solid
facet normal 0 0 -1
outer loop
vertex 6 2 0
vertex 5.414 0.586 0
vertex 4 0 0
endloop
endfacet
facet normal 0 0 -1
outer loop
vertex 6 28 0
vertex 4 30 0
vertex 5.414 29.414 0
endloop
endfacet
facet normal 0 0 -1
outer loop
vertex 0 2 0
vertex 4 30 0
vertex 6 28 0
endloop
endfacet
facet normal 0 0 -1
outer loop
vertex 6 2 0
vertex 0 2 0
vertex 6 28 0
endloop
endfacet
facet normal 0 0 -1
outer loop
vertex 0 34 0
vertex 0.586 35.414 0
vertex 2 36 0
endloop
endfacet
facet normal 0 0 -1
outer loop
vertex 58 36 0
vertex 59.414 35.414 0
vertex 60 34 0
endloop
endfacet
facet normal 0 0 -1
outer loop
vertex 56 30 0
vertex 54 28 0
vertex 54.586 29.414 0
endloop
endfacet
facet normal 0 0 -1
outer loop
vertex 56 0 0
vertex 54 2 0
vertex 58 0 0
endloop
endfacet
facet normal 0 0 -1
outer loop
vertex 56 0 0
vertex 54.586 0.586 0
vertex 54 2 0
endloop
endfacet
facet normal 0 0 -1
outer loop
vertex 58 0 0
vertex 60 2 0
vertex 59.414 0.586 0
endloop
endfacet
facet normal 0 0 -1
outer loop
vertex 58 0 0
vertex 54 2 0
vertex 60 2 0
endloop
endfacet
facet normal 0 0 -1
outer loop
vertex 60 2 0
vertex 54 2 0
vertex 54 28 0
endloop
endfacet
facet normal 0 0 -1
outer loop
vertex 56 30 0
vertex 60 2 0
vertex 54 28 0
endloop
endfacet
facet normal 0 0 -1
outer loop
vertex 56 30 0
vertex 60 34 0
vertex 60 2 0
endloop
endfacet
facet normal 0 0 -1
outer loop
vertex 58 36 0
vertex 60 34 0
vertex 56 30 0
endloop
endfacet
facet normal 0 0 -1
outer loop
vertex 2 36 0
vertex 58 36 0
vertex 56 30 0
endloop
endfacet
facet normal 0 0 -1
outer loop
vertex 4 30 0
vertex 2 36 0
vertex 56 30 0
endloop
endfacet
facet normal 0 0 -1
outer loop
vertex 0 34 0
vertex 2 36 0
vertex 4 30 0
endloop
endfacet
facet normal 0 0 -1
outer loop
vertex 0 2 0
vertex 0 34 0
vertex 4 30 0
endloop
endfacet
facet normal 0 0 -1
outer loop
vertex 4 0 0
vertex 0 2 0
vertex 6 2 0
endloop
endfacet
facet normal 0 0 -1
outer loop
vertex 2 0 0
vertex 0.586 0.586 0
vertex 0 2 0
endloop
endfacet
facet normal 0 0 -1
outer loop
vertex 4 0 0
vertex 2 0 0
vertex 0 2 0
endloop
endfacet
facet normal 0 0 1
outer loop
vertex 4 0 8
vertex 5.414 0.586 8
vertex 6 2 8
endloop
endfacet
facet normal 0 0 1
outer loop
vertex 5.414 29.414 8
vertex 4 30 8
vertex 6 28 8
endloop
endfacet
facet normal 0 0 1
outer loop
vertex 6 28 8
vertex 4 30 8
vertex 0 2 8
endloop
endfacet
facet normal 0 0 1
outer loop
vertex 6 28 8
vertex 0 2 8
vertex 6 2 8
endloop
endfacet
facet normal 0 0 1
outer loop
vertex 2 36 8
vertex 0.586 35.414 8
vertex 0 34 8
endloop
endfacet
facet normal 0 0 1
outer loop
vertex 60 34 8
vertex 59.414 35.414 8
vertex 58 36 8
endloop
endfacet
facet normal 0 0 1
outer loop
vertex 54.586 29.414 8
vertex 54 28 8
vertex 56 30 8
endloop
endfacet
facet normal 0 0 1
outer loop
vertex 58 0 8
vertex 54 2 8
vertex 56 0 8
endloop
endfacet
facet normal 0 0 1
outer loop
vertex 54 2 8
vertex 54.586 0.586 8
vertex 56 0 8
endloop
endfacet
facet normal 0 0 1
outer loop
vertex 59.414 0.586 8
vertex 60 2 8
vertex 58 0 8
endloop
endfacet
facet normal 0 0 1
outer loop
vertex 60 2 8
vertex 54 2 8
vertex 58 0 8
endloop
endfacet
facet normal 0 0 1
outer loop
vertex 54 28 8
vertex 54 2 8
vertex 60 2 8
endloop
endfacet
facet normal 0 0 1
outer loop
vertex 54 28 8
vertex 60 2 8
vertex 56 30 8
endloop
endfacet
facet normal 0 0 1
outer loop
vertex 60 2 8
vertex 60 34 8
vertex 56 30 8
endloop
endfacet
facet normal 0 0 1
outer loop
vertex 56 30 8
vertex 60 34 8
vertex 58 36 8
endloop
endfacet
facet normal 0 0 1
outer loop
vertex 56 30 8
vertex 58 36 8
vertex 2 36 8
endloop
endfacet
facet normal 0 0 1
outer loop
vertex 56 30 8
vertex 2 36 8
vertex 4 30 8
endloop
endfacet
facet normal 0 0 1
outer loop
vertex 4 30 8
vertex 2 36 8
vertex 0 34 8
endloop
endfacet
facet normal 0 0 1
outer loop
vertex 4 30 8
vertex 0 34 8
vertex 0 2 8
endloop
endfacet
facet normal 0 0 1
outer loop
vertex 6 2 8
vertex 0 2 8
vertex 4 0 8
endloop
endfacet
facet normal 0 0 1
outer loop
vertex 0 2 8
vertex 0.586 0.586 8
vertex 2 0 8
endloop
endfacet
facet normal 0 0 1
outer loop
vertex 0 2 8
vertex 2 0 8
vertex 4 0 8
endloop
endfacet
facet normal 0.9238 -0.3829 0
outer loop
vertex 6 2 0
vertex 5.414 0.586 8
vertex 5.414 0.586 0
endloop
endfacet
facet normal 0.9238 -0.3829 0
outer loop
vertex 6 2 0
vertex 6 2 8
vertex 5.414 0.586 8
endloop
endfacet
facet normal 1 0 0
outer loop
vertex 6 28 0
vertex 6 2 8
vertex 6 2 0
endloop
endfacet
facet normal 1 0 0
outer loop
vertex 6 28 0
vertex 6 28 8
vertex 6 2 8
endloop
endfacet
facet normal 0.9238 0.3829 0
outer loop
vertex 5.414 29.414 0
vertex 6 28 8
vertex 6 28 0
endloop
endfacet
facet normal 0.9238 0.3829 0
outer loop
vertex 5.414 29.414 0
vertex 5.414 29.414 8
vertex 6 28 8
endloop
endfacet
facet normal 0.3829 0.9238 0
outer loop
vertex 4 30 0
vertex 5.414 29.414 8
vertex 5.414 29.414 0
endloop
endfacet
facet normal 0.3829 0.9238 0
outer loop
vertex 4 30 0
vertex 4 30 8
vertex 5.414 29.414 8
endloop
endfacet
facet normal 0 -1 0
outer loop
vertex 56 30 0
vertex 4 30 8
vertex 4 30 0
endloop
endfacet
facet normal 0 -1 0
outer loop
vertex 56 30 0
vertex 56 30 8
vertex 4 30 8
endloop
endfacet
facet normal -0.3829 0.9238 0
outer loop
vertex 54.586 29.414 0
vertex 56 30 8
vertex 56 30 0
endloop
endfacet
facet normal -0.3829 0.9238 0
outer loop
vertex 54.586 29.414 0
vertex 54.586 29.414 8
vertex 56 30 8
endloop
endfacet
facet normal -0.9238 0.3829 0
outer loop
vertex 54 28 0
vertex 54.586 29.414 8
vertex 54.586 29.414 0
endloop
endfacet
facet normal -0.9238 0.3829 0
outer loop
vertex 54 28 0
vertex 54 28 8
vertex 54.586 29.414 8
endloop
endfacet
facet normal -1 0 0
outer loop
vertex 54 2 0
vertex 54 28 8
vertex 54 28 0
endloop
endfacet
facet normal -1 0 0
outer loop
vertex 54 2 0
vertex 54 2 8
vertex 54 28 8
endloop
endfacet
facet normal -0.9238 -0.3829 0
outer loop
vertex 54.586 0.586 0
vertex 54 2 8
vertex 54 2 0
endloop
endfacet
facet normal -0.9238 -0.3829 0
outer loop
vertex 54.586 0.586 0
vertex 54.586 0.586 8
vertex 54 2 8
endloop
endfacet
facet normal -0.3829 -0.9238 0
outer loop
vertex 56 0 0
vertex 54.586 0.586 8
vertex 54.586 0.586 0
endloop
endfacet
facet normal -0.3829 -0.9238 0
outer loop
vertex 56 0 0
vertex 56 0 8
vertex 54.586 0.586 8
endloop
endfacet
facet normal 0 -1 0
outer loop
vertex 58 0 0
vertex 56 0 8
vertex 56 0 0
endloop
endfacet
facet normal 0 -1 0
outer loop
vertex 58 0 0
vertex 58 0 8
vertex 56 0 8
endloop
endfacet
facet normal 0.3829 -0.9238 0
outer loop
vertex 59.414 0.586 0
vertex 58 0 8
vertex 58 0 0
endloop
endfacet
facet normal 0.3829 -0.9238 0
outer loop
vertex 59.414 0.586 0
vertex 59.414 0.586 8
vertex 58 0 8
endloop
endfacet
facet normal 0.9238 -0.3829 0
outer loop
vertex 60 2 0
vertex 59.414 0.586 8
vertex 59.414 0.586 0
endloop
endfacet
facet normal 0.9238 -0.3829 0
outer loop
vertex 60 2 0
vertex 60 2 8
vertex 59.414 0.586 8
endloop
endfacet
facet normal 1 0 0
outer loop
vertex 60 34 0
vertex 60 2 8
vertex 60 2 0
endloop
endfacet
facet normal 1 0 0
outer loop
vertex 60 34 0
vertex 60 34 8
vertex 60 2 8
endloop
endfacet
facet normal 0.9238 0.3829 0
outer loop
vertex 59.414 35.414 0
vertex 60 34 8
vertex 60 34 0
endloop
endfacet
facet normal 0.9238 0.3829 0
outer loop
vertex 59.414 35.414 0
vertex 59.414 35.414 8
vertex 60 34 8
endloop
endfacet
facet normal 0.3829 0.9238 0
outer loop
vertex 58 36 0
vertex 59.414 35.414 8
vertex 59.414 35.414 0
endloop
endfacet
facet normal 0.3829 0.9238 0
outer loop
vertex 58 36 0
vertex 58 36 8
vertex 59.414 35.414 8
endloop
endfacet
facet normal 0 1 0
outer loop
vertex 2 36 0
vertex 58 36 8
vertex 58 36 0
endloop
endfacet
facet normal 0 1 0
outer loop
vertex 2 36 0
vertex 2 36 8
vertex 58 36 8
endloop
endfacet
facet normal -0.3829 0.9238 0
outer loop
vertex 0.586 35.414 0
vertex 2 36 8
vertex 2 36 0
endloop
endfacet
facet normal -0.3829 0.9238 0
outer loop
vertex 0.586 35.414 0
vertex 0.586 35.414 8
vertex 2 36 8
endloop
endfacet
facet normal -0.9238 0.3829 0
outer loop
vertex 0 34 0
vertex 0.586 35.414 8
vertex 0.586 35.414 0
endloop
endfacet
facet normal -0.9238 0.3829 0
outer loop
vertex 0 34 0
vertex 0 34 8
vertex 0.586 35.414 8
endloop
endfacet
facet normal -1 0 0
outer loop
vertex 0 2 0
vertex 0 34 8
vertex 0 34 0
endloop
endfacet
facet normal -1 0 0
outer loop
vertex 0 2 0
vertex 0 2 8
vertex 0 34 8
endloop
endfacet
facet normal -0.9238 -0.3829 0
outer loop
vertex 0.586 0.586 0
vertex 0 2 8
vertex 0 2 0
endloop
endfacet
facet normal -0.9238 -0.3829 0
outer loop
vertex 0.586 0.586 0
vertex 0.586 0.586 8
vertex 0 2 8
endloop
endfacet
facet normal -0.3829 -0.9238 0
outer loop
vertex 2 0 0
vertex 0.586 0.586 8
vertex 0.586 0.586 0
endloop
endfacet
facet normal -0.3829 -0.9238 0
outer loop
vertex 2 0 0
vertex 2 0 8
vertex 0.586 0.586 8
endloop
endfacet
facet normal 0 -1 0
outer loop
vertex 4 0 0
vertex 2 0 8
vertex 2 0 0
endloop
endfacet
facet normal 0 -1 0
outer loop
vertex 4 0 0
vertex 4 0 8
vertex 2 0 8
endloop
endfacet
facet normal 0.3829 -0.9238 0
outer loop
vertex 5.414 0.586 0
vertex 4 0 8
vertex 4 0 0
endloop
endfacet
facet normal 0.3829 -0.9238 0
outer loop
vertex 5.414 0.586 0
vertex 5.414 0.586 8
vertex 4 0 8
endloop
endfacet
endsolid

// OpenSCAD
$fn = 32;

// ----------------------------------------------------------------------
// Clip blank: staple clip, 8 mm thick
// ----------------------------------------------------------------------

// --- parameters (mm) ---
profile_height = 8;       // extrusion height
profile_points = 24;      // points of the closed outline

profile = [[0, 2], [0.586, 0.586], [2, 0], [4, 0], [5.414, 0.586], [6, 2], [6, 28], [5.414, 29.414], [4, 30], [56, 30], [54.586, 29.414], [54, 28], [54, 2], [54.586, 0.586], [56, 0], [58, 0], [59.414, 0.586], [60, 2], [60, 34], [59.414, 35.414], [58, 36], [2, 36], [0.586, 35.414], [0, 34]];  // single closed polygon, 24 points, counter clockwise

// --- the one profile operation ---
linear_extrude(height = profile_height) polygon(points = profile);
